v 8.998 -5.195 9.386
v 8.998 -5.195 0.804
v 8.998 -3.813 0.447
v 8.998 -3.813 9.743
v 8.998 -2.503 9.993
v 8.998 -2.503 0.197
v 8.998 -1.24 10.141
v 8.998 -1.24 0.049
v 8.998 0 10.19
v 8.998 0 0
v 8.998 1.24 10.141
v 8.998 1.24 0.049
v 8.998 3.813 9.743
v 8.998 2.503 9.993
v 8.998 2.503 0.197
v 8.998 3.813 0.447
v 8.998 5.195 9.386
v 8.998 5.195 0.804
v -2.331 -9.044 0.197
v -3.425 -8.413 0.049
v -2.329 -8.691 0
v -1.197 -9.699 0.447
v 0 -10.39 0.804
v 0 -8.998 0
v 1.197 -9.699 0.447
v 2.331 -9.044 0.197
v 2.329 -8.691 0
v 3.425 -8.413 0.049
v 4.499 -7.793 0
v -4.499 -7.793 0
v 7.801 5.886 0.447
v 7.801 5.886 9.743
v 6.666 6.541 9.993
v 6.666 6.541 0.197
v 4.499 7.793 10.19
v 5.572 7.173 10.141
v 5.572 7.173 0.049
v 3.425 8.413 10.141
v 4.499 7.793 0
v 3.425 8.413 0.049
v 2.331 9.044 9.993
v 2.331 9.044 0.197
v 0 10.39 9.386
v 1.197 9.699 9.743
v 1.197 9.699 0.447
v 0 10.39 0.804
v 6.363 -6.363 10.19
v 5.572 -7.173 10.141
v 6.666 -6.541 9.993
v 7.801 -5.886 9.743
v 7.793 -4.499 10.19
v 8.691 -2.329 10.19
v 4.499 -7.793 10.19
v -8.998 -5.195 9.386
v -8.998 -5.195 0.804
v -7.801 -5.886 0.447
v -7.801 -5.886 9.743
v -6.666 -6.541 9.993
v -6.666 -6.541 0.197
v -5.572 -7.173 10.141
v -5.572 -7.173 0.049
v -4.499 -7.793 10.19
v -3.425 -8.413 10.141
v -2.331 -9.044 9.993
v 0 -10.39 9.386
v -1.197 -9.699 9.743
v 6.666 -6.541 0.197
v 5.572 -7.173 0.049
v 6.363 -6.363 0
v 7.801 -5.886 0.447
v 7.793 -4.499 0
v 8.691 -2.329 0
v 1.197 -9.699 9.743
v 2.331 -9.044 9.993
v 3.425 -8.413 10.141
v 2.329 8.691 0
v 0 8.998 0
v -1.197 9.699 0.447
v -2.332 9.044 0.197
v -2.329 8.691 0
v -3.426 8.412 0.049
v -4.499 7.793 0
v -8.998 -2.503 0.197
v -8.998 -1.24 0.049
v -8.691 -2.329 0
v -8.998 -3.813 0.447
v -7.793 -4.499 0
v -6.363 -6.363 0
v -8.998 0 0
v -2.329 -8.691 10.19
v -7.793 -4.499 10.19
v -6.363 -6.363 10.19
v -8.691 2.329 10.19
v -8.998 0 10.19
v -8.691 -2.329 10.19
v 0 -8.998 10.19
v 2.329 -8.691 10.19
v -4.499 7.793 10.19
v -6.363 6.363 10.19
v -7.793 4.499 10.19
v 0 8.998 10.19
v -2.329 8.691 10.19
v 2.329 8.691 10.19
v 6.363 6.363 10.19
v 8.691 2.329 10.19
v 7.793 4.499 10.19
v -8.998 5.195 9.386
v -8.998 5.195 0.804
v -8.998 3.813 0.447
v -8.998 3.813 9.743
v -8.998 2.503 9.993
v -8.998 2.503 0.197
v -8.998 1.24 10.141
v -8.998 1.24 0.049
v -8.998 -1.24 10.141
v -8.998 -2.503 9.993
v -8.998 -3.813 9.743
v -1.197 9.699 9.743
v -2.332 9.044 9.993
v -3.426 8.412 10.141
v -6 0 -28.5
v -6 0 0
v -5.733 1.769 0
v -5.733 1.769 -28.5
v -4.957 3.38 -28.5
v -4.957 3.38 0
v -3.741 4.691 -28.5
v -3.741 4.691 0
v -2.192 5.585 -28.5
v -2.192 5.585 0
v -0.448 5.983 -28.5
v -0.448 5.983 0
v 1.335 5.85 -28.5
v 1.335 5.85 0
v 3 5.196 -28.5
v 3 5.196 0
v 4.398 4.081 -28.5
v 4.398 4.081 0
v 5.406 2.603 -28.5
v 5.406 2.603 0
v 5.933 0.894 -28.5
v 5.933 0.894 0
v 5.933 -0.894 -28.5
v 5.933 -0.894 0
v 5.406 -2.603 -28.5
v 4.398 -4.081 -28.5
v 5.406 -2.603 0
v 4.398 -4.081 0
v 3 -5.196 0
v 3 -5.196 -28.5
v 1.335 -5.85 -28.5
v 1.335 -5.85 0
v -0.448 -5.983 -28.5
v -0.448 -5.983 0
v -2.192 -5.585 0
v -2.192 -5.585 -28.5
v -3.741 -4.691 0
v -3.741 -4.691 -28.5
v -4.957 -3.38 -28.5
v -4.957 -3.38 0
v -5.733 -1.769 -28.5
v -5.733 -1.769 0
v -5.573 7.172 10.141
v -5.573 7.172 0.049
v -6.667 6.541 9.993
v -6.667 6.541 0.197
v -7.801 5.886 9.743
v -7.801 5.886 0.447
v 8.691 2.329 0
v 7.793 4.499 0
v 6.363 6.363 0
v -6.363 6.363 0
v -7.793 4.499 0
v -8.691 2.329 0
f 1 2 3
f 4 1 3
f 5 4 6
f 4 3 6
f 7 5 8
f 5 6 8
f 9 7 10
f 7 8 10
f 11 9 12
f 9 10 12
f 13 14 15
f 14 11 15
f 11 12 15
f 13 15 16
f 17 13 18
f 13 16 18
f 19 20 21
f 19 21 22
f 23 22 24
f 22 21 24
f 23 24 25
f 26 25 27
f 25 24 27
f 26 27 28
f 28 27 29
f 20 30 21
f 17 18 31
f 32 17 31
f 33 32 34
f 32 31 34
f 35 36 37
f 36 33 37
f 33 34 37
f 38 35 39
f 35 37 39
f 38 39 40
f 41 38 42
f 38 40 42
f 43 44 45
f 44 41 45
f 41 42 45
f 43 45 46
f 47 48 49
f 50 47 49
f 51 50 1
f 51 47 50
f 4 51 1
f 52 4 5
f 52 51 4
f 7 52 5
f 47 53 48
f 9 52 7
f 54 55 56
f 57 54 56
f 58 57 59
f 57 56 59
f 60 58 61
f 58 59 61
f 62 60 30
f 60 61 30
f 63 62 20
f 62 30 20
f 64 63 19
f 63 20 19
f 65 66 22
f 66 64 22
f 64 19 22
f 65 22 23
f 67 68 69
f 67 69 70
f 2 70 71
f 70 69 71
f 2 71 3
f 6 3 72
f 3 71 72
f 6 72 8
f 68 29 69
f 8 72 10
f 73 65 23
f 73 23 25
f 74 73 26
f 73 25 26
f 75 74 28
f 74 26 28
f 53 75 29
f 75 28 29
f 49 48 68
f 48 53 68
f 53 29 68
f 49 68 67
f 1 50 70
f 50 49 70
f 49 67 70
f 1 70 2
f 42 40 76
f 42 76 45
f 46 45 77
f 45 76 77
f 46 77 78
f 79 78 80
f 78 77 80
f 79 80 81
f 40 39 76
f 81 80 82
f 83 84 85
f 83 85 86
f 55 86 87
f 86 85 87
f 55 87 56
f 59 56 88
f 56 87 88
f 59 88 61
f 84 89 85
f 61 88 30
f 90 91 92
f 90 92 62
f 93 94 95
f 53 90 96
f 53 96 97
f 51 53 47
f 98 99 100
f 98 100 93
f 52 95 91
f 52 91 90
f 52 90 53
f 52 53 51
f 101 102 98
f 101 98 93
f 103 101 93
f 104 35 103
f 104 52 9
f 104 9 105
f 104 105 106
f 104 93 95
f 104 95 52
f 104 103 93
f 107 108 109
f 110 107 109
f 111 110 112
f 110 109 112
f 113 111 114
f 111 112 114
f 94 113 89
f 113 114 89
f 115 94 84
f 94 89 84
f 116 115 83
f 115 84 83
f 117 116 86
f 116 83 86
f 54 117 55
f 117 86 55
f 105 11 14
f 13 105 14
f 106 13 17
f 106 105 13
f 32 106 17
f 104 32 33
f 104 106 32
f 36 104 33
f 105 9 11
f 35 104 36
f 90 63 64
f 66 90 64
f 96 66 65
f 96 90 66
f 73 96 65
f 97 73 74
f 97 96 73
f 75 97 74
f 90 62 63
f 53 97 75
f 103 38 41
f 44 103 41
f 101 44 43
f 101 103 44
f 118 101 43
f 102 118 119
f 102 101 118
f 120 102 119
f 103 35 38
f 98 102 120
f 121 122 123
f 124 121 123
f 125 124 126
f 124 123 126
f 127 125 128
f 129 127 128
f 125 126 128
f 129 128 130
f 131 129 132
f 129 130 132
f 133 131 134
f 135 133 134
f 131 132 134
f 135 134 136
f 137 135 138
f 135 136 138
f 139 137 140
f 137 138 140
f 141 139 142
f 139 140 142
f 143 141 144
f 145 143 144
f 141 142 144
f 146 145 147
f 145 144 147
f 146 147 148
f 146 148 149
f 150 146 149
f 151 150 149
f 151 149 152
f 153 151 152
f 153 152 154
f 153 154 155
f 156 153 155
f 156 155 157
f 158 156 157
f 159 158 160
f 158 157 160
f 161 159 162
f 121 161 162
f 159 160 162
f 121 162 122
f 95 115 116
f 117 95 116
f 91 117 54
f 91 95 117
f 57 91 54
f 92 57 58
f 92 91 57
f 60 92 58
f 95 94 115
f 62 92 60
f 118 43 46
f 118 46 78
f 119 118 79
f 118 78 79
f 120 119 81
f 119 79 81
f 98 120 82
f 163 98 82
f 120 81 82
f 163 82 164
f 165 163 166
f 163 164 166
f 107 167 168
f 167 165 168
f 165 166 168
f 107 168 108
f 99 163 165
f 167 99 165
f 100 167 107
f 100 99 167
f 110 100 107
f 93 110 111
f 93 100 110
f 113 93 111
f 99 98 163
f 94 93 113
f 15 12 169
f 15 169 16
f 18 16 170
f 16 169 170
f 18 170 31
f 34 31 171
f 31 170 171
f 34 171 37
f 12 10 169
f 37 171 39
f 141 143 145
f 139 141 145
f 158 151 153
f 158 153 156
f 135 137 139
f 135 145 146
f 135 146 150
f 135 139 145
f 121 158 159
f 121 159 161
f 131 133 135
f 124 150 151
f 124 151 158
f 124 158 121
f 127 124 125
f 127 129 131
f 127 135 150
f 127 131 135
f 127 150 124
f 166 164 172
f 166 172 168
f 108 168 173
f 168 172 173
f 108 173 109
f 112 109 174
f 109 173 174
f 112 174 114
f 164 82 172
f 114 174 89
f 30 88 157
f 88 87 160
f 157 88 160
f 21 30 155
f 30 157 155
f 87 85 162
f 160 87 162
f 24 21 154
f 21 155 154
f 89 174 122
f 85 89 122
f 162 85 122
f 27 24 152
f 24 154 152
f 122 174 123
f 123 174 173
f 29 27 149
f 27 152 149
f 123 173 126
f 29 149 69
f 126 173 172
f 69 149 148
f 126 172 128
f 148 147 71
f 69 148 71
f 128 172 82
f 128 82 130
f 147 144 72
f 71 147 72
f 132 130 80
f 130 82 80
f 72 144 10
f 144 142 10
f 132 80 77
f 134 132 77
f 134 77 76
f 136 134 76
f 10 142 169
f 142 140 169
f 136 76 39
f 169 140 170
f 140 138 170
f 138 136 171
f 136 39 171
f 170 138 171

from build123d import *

# Parameters (mm, degrees)
PAD_DEPTH    = 10.19
SKETCH002_R  = 6
PAD001_DEPTH = 28.5


with BuildPart() as part:
    # Sketch → Pad (new body)
    with BuildSketch(Plane.XY):
        Polygon((0, 10.39), (-8.998004, 5.195), (-8.998004, -5.195), (0, -10.39), (8.998004, -5.195), (8.998004, 5.195), align=None)
    extrude(amount=PAD_DEPTH)

    # Sketch002 (on DatumPlane) → Pad001 (join)
    with BuildSketch(Plane(origin=(0, 0, 0), x_dir=(-1, 0, 0), z_dir=(0, 0, -1))):
        Circle(SKETCH002_R)
    extrude(amount=PAD001_DEPTH)

    # Sketch001 → Groove (revolve, cut)
    with BuildSketch(Plane.YZ):
        Polygon((-8.998004, 10.19), (-19.388004, 10.19), (-19.388004, 4.191331), align=None)
        Polygon((-8.998004, 0), (-19.388004, 0), (-19.388004, 5.998669), align=None)
    revolve(axis=Axis((0, 0, 0), (0, 0, 1)), mode=Mode.SUBTRACT)


solid = part.part
